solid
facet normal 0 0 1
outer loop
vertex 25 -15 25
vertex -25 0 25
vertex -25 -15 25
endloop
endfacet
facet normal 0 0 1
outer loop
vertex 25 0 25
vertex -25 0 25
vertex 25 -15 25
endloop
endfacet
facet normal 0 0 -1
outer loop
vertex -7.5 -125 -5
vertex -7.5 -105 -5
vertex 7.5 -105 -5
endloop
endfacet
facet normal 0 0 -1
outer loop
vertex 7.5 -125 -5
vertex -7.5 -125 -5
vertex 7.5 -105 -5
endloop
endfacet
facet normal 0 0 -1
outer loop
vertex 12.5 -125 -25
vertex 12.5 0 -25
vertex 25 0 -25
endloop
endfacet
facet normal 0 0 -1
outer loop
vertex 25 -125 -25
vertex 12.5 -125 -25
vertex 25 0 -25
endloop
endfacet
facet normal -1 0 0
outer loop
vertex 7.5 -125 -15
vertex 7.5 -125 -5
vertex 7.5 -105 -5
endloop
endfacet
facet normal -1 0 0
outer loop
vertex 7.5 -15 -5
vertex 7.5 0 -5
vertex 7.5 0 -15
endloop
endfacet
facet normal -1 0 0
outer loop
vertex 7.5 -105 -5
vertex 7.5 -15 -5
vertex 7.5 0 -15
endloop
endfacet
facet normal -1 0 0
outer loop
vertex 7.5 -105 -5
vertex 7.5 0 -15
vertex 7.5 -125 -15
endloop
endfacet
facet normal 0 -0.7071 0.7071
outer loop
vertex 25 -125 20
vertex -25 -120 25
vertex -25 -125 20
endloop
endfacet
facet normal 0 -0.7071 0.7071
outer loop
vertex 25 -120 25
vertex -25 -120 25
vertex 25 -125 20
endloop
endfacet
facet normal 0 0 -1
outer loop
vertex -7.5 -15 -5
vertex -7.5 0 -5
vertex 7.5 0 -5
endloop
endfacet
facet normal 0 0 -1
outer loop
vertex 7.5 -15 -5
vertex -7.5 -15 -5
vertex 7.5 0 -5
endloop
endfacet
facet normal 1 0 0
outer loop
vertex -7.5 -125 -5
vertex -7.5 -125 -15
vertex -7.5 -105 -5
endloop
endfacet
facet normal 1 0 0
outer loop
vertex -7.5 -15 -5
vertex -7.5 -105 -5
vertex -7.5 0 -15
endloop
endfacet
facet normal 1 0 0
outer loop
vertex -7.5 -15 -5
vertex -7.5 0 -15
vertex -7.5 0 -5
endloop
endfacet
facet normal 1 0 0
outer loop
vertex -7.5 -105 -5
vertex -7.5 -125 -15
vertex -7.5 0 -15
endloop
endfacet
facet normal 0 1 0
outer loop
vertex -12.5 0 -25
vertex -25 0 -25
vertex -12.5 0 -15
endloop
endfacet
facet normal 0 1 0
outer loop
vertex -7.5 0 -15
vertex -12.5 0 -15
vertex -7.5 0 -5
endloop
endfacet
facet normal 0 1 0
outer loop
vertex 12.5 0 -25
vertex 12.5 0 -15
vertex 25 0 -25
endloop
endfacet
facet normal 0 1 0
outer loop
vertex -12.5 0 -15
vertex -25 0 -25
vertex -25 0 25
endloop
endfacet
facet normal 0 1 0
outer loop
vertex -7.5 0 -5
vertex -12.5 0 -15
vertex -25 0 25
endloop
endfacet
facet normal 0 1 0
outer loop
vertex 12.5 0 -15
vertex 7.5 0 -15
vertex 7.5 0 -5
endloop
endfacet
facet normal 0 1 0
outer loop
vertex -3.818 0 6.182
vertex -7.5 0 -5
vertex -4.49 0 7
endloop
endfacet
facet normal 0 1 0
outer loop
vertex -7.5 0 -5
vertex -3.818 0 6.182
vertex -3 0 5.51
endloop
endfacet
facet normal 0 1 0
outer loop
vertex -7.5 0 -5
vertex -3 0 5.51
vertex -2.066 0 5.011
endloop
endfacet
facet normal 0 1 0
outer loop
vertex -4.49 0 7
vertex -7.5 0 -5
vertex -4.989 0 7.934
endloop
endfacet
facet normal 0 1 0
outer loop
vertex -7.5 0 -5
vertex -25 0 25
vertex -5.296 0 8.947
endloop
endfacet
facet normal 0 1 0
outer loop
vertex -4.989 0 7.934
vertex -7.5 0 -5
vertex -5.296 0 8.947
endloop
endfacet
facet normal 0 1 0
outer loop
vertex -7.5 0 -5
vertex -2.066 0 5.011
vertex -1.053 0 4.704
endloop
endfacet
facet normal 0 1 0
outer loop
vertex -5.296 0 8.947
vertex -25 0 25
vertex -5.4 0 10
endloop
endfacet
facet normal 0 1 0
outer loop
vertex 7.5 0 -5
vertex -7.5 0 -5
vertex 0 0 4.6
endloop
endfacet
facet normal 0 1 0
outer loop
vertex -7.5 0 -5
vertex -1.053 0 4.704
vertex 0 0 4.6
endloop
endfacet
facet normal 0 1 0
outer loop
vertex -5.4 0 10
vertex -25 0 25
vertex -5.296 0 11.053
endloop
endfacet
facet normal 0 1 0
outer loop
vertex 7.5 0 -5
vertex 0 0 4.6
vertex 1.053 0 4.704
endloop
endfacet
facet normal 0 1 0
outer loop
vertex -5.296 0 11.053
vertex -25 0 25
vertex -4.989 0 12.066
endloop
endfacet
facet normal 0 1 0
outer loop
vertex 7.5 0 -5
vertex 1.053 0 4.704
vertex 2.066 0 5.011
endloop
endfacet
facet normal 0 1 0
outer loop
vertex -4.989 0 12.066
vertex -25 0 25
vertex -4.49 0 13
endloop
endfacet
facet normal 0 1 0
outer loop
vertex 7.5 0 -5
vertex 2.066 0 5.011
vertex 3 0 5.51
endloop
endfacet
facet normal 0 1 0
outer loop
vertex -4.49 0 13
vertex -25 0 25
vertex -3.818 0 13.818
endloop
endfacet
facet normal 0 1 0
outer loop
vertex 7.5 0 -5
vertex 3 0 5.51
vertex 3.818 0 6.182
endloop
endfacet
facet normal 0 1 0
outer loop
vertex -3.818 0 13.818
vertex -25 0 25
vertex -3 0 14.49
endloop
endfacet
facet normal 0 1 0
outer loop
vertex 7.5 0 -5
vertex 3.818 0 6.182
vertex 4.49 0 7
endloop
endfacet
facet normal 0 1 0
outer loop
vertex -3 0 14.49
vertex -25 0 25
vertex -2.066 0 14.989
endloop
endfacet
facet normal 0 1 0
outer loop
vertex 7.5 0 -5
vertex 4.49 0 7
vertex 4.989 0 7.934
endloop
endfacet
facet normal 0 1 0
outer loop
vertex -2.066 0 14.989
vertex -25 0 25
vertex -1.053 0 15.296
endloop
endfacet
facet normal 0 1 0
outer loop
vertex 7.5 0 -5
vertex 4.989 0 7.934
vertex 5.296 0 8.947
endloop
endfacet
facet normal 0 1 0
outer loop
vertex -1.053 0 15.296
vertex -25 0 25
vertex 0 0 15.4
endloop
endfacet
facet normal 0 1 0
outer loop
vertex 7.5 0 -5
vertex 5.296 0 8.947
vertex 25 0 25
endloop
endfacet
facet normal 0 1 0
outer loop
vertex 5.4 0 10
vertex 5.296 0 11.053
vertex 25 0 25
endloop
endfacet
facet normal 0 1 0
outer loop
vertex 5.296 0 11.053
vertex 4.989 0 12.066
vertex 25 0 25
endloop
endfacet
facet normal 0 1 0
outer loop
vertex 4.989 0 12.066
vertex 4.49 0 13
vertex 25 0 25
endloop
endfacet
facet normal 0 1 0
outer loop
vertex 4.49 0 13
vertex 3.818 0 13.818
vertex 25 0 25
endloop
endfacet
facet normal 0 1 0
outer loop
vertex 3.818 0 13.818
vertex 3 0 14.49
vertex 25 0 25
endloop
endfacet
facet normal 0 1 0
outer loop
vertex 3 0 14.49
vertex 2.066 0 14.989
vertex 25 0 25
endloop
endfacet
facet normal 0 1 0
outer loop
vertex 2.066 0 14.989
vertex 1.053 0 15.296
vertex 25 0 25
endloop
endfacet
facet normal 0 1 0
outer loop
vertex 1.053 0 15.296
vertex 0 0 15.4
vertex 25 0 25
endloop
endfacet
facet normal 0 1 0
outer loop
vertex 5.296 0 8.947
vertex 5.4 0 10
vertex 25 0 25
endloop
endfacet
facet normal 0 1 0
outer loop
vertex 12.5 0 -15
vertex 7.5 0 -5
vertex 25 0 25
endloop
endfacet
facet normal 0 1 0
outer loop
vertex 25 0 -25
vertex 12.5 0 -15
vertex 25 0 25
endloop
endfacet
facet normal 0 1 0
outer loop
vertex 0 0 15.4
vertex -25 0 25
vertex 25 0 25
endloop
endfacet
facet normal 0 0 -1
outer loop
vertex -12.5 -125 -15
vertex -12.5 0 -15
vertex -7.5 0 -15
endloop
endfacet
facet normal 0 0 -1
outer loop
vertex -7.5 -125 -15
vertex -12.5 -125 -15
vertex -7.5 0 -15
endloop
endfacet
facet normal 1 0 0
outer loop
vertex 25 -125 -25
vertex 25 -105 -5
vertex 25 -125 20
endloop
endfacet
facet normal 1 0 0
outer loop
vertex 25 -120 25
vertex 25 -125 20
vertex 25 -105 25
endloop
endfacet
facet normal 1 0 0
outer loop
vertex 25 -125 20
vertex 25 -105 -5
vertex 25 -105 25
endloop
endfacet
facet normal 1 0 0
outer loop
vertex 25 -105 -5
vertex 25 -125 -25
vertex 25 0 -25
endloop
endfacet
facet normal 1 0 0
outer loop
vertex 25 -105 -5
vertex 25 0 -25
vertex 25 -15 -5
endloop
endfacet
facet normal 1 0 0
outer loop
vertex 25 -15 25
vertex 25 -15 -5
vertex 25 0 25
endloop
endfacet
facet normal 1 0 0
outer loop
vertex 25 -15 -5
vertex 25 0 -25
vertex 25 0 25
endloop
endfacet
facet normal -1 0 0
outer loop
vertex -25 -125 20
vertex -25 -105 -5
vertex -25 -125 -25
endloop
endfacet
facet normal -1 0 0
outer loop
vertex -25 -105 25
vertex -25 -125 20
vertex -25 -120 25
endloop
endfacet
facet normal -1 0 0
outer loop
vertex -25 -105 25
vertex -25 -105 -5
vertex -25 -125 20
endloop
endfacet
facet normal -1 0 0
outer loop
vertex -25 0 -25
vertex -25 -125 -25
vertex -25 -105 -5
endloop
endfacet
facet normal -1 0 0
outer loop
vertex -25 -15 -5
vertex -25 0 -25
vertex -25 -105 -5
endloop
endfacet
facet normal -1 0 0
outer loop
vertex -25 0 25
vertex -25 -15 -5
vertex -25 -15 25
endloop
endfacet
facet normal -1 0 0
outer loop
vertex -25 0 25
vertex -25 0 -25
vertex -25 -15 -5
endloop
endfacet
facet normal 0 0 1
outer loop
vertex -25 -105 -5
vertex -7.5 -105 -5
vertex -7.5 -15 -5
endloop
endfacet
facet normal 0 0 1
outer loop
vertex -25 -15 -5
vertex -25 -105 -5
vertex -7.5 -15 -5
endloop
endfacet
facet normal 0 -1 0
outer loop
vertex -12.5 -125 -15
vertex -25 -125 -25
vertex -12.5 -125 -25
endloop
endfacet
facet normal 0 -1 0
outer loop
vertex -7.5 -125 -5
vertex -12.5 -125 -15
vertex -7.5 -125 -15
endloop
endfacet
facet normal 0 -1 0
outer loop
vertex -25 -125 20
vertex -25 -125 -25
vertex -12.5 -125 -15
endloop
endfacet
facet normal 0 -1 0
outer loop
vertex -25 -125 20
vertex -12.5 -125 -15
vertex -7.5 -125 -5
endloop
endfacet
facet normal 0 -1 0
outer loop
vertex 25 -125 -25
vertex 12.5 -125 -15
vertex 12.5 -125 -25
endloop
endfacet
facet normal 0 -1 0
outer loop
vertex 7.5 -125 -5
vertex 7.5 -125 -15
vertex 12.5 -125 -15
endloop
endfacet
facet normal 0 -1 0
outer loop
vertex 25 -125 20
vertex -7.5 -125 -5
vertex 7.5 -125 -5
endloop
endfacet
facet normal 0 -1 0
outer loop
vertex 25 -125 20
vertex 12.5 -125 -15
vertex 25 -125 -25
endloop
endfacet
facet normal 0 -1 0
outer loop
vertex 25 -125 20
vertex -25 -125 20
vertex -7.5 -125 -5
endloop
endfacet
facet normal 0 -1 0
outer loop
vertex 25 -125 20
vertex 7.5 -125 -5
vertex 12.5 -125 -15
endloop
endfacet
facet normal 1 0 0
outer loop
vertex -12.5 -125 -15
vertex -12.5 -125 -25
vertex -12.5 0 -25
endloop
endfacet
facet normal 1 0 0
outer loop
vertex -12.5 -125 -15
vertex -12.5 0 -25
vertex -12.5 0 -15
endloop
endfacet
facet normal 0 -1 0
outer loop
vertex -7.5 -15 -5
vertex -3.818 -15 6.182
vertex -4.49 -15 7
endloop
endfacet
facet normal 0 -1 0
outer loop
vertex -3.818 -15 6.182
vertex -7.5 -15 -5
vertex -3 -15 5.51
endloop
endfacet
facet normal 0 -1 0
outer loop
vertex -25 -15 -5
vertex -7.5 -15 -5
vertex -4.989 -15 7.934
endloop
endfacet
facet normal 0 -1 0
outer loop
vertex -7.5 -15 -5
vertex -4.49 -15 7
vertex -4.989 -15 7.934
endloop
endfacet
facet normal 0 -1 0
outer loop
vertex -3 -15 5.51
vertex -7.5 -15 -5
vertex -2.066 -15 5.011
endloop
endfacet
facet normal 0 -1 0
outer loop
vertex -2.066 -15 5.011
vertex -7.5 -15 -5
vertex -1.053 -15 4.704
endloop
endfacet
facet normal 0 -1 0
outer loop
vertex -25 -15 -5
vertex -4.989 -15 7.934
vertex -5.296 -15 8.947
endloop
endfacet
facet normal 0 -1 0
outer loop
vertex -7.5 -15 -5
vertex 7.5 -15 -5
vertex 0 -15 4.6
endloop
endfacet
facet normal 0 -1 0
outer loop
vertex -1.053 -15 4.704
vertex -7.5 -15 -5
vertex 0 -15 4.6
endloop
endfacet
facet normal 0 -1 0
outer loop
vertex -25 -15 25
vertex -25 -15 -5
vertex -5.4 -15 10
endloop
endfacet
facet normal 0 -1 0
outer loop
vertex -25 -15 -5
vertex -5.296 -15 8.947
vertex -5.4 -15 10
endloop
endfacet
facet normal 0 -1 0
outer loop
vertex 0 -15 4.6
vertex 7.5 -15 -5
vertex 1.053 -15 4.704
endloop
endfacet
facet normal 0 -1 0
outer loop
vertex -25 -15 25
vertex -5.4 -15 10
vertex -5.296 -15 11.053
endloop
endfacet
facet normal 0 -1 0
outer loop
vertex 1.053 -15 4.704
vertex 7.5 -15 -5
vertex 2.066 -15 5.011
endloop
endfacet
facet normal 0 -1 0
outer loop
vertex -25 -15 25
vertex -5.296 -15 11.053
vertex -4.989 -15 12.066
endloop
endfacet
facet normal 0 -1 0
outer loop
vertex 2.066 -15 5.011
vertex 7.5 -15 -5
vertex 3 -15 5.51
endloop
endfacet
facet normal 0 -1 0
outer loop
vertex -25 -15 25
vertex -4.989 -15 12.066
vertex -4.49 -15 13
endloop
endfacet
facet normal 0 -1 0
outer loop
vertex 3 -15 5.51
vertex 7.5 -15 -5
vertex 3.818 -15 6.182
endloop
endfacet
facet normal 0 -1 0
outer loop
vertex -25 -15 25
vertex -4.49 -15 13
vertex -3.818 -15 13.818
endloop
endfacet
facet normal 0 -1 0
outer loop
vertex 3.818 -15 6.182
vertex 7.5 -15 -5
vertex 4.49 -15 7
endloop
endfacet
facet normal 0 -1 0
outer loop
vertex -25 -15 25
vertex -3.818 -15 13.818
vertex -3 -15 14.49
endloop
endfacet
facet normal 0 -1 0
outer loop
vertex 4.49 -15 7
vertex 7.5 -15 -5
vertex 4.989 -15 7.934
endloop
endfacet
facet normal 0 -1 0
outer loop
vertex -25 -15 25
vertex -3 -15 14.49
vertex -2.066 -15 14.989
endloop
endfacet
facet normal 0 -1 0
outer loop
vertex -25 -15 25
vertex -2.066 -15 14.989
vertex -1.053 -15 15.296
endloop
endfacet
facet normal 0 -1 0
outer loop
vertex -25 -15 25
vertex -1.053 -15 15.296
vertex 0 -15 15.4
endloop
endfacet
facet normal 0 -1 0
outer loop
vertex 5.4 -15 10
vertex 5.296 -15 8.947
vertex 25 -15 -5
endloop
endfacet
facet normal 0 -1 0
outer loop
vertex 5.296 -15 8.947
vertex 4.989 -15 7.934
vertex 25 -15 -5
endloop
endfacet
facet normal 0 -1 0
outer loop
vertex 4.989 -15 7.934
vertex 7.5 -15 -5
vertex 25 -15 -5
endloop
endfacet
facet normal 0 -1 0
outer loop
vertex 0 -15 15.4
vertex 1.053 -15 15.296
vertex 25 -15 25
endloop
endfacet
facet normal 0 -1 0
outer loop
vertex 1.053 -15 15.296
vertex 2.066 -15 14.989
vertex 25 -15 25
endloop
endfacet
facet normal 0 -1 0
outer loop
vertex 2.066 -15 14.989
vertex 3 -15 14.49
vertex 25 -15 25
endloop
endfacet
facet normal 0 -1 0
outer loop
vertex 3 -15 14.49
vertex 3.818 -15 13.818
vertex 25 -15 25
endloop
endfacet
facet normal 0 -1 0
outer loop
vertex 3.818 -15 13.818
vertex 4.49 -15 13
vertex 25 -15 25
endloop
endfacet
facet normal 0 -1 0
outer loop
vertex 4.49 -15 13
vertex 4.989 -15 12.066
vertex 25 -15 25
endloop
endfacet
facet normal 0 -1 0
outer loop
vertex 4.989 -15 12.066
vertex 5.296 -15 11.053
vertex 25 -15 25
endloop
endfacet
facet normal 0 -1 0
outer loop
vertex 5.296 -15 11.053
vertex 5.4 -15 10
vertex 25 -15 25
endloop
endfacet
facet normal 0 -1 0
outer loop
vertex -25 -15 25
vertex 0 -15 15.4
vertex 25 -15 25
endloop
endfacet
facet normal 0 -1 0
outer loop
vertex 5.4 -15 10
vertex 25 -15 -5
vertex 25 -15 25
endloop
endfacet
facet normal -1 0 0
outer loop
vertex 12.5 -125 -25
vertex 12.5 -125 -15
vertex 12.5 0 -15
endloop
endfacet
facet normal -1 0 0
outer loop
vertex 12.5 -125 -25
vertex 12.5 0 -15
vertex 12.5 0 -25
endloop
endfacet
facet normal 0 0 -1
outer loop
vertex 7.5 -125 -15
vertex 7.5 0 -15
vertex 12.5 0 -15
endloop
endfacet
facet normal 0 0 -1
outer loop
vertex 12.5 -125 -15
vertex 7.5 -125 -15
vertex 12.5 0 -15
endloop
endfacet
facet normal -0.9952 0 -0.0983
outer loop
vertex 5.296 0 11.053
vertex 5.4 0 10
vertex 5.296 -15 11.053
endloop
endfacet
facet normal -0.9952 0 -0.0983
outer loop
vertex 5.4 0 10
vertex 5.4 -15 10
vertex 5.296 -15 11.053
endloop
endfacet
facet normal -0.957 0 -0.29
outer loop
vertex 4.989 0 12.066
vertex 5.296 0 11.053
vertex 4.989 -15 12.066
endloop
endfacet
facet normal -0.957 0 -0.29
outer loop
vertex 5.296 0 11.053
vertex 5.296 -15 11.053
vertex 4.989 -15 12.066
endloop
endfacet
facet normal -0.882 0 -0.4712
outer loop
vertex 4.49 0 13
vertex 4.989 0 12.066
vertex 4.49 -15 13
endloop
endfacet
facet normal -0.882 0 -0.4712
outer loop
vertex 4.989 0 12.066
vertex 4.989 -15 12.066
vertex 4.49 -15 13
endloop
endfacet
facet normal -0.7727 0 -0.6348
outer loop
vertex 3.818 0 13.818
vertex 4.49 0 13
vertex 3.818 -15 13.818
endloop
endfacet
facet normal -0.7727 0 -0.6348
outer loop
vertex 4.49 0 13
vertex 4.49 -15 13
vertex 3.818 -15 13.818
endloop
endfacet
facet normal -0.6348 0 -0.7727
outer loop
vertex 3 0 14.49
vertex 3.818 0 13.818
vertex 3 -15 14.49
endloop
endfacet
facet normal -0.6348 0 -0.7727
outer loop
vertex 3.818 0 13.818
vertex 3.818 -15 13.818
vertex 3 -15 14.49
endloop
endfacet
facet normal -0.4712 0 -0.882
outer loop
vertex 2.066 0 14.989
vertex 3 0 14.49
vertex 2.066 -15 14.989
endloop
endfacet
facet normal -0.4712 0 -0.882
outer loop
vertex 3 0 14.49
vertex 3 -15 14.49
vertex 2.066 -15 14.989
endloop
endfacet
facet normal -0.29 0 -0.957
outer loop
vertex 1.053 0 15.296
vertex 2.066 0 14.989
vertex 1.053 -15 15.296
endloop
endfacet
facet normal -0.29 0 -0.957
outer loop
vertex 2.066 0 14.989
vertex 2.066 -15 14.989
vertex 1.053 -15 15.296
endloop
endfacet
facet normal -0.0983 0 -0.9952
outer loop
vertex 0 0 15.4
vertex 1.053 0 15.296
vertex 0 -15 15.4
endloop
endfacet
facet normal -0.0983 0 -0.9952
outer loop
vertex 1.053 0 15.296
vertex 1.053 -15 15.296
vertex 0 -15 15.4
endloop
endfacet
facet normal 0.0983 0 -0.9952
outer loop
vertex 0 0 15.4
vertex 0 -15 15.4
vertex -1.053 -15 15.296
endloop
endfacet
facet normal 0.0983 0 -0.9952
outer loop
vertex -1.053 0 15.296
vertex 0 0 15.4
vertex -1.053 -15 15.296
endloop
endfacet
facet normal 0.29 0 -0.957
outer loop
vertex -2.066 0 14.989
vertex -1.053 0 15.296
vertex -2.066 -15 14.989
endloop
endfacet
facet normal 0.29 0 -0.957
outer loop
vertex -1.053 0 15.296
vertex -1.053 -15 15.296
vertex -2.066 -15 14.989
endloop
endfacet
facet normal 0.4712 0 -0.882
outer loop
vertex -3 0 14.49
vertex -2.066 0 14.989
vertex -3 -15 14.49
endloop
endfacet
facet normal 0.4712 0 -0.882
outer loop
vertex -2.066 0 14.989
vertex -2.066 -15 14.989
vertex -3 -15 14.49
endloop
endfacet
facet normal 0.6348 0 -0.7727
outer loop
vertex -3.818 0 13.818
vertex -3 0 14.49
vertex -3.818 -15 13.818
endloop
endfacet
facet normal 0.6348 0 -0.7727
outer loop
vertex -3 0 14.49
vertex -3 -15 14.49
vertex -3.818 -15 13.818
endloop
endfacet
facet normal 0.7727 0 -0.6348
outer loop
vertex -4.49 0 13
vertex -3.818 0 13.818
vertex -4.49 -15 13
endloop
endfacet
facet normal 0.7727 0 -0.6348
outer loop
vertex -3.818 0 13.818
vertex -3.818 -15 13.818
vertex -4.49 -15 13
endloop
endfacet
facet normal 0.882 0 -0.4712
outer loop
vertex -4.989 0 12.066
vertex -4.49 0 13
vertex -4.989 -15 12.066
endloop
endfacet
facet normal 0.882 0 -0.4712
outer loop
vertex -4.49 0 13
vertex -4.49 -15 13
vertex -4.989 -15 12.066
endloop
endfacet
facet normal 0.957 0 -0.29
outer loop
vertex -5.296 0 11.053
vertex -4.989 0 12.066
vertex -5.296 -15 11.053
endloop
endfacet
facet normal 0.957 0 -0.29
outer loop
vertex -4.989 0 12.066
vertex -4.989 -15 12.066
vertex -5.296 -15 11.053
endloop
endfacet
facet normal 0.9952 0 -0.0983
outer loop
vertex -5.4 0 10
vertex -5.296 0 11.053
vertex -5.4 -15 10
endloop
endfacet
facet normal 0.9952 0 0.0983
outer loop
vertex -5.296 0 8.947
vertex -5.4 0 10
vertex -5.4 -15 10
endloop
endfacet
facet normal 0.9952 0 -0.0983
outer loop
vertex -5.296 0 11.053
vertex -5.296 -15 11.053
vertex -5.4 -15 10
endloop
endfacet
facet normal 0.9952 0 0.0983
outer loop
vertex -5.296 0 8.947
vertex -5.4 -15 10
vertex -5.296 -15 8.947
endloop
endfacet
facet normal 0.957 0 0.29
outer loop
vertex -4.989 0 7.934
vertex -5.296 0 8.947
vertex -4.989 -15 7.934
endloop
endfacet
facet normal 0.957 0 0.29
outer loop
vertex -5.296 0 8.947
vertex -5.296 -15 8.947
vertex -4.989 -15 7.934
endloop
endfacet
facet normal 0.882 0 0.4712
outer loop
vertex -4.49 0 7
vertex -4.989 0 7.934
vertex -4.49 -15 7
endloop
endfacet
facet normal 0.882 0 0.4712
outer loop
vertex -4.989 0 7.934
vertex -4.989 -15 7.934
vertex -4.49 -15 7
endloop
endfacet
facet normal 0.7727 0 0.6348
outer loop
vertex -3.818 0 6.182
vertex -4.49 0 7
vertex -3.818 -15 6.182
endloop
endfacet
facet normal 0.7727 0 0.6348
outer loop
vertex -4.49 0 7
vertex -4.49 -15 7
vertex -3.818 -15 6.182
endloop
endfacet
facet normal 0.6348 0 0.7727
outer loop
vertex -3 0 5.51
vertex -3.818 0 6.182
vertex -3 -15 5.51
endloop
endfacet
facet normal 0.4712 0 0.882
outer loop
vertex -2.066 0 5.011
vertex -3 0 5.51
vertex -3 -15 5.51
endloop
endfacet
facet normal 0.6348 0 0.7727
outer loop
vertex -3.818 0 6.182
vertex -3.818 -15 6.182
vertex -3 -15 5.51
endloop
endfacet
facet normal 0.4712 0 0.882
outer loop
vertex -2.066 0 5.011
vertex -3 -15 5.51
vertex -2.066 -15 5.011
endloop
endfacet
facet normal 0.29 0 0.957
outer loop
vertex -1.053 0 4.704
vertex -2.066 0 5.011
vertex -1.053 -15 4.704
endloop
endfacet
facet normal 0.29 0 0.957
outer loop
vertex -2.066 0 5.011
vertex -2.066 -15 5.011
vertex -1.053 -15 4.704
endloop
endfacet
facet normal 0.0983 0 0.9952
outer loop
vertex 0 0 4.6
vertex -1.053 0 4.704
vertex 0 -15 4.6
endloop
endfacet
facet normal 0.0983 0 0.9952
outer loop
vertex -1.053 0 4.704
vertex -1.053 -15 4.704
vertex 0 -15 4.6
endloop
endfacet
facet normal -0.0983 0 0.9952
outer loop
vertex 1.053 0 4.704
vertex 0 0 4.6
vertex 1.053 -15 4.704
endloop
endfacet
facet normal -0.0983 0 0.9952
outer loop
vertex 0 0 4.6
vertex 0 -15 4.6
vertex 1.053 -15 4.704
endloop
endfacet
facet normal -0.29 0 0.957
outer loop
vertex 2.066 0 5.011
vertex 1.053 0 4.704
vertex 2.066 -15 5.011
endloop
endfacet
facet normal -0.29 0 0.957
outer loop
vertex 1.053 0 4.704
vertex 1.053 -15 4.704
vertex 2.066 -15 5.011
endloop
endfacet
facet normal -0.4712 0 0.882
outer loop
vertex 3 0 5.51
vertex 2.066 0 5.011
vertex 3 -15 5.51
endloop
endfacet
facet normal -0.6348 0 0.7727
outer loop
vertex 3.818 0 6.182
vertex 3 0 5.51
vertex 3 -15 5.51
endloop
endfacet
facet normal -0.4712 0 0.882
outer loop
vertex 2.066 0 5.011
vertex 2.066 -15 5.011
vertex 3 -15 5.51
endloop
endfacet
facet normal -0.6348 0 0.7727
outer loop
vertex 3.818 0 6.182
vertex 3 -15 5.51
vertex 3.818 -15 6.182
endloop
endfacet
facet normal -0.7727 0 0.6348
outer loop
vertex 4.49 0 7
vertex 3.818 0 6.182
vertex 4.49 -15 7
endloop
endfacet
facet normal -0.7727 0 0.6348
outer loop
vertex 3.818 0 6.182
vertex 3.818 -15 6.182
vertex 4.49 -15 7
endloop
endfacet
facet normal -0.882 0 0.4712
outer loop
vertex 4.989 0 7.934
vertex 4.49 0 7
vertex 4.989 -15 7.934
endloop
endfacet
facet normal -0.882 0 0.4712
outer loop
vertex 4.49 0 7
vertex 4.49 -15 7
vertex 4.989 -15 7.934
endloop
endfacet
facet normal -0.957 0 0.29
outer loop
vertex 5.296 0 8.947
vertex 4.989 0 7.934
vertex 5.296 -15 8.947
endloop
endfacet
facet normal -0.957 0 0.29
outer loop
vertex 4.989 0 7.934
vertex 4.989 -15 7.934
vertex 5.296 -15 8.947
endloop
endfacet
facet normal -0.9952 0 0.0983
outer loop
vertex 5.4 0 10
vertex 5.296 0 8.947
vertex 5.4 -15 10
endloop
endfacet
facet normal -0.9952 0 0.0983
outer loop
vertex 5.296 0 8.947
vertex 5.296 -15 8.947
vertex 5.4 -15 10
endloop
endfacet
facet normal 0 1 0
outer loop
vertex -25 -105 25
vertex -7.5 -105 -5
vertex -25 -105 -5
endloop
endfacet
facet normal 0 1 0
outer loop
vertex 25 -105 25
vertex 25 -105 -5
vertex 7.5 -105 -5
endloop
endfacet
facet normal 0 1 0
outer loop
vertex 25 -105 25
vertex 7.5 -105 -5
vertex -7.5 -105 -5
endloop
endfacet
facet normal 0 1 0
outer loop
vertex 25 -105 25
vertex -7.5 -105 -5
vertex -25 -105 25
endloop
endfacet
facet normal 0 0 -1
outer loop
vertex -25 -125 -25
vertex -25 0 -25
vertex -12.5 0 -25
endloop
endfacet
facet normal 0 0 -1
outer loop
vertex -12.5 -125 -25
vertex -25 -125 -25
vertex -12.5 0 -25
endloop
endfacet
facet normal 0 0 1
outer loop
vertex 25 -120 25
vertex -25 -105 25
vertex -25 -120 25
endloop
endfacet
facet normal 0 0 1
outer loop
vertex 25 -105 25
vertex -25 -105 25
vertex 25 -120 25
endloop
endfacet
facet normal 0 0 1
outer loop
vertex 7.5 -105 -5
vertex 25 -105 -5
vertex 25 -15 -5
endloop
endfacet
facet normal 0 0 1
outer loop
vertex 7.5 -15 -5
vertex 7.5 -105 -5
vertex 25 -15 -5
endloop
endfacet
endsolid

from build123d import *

# Parameters (mm, degrees)
F0_W     = 50
F0_H     = 50
F1_DEPTH = 125
F2_W     = 90
F2_H     = 30
F3_DEPTH = 50
F5_DEPTH = 125
F6_D     = 10.8
F6_DEPTH = 15
F6_TIP   = 3.2446473427
F7_SIZE  = 5


with BuildPart() as f1:
    # F0 (on Front) → F1 (new body)
    with BuildSketch(Plane.XZ):
        Rectangle(F0_W, F0_H)
    extrude(amount=F1_DEPTH)

    # F2 (on face) → F3 (cut)
    with BuildSketch(Plane.YZ.offset(25)):
        with Locations((-60, 10)):
            Rectangle(F2_W, F2_H)
    extrude(amount=-F3_DEPTH, mode=Mode.SUBTRACT)

    # F4 (on face) → F5 (cut)
    with BuildSketch(Plane(origin=(0, 0, 0), x_dir=(-1, 0, 0), z_dir=(0, 1, 0))):
        Polygon((-12.5, -15), (-12.5, -25), (12.5, -25), (12.5, -15), (7.5, -15), (7.5, -5), (-7.5, -5), (-7.5, -15), align=None)
    extrude(amount=-F5_DEPTH, mode=Mode.SUBTRACT)

    # F6
    with Locations(Plane(origin=(0, 0, 0), x_dir=(-1, 0, 0), z_dir=(0, 1, 0))):
        with Locations((0, 10)):
            Hole(F6_D / 2, depth=F6_DEPTH)
            with Locations((0, 0, -(F6_DEPTH + F6_TIP / 2))):  # 118° drill point
                Cone(0, F6_D / 2, F6_TIP, mode=Mode.SUBTRACT)

    # F7
    f7_edges = [f1.edges().sort_by_distance(p)[0] for p in [
        (0, -125, 25),
    ]]
    chamfer(f7_edges, length=F7_SIZE)


solid = f1.part
